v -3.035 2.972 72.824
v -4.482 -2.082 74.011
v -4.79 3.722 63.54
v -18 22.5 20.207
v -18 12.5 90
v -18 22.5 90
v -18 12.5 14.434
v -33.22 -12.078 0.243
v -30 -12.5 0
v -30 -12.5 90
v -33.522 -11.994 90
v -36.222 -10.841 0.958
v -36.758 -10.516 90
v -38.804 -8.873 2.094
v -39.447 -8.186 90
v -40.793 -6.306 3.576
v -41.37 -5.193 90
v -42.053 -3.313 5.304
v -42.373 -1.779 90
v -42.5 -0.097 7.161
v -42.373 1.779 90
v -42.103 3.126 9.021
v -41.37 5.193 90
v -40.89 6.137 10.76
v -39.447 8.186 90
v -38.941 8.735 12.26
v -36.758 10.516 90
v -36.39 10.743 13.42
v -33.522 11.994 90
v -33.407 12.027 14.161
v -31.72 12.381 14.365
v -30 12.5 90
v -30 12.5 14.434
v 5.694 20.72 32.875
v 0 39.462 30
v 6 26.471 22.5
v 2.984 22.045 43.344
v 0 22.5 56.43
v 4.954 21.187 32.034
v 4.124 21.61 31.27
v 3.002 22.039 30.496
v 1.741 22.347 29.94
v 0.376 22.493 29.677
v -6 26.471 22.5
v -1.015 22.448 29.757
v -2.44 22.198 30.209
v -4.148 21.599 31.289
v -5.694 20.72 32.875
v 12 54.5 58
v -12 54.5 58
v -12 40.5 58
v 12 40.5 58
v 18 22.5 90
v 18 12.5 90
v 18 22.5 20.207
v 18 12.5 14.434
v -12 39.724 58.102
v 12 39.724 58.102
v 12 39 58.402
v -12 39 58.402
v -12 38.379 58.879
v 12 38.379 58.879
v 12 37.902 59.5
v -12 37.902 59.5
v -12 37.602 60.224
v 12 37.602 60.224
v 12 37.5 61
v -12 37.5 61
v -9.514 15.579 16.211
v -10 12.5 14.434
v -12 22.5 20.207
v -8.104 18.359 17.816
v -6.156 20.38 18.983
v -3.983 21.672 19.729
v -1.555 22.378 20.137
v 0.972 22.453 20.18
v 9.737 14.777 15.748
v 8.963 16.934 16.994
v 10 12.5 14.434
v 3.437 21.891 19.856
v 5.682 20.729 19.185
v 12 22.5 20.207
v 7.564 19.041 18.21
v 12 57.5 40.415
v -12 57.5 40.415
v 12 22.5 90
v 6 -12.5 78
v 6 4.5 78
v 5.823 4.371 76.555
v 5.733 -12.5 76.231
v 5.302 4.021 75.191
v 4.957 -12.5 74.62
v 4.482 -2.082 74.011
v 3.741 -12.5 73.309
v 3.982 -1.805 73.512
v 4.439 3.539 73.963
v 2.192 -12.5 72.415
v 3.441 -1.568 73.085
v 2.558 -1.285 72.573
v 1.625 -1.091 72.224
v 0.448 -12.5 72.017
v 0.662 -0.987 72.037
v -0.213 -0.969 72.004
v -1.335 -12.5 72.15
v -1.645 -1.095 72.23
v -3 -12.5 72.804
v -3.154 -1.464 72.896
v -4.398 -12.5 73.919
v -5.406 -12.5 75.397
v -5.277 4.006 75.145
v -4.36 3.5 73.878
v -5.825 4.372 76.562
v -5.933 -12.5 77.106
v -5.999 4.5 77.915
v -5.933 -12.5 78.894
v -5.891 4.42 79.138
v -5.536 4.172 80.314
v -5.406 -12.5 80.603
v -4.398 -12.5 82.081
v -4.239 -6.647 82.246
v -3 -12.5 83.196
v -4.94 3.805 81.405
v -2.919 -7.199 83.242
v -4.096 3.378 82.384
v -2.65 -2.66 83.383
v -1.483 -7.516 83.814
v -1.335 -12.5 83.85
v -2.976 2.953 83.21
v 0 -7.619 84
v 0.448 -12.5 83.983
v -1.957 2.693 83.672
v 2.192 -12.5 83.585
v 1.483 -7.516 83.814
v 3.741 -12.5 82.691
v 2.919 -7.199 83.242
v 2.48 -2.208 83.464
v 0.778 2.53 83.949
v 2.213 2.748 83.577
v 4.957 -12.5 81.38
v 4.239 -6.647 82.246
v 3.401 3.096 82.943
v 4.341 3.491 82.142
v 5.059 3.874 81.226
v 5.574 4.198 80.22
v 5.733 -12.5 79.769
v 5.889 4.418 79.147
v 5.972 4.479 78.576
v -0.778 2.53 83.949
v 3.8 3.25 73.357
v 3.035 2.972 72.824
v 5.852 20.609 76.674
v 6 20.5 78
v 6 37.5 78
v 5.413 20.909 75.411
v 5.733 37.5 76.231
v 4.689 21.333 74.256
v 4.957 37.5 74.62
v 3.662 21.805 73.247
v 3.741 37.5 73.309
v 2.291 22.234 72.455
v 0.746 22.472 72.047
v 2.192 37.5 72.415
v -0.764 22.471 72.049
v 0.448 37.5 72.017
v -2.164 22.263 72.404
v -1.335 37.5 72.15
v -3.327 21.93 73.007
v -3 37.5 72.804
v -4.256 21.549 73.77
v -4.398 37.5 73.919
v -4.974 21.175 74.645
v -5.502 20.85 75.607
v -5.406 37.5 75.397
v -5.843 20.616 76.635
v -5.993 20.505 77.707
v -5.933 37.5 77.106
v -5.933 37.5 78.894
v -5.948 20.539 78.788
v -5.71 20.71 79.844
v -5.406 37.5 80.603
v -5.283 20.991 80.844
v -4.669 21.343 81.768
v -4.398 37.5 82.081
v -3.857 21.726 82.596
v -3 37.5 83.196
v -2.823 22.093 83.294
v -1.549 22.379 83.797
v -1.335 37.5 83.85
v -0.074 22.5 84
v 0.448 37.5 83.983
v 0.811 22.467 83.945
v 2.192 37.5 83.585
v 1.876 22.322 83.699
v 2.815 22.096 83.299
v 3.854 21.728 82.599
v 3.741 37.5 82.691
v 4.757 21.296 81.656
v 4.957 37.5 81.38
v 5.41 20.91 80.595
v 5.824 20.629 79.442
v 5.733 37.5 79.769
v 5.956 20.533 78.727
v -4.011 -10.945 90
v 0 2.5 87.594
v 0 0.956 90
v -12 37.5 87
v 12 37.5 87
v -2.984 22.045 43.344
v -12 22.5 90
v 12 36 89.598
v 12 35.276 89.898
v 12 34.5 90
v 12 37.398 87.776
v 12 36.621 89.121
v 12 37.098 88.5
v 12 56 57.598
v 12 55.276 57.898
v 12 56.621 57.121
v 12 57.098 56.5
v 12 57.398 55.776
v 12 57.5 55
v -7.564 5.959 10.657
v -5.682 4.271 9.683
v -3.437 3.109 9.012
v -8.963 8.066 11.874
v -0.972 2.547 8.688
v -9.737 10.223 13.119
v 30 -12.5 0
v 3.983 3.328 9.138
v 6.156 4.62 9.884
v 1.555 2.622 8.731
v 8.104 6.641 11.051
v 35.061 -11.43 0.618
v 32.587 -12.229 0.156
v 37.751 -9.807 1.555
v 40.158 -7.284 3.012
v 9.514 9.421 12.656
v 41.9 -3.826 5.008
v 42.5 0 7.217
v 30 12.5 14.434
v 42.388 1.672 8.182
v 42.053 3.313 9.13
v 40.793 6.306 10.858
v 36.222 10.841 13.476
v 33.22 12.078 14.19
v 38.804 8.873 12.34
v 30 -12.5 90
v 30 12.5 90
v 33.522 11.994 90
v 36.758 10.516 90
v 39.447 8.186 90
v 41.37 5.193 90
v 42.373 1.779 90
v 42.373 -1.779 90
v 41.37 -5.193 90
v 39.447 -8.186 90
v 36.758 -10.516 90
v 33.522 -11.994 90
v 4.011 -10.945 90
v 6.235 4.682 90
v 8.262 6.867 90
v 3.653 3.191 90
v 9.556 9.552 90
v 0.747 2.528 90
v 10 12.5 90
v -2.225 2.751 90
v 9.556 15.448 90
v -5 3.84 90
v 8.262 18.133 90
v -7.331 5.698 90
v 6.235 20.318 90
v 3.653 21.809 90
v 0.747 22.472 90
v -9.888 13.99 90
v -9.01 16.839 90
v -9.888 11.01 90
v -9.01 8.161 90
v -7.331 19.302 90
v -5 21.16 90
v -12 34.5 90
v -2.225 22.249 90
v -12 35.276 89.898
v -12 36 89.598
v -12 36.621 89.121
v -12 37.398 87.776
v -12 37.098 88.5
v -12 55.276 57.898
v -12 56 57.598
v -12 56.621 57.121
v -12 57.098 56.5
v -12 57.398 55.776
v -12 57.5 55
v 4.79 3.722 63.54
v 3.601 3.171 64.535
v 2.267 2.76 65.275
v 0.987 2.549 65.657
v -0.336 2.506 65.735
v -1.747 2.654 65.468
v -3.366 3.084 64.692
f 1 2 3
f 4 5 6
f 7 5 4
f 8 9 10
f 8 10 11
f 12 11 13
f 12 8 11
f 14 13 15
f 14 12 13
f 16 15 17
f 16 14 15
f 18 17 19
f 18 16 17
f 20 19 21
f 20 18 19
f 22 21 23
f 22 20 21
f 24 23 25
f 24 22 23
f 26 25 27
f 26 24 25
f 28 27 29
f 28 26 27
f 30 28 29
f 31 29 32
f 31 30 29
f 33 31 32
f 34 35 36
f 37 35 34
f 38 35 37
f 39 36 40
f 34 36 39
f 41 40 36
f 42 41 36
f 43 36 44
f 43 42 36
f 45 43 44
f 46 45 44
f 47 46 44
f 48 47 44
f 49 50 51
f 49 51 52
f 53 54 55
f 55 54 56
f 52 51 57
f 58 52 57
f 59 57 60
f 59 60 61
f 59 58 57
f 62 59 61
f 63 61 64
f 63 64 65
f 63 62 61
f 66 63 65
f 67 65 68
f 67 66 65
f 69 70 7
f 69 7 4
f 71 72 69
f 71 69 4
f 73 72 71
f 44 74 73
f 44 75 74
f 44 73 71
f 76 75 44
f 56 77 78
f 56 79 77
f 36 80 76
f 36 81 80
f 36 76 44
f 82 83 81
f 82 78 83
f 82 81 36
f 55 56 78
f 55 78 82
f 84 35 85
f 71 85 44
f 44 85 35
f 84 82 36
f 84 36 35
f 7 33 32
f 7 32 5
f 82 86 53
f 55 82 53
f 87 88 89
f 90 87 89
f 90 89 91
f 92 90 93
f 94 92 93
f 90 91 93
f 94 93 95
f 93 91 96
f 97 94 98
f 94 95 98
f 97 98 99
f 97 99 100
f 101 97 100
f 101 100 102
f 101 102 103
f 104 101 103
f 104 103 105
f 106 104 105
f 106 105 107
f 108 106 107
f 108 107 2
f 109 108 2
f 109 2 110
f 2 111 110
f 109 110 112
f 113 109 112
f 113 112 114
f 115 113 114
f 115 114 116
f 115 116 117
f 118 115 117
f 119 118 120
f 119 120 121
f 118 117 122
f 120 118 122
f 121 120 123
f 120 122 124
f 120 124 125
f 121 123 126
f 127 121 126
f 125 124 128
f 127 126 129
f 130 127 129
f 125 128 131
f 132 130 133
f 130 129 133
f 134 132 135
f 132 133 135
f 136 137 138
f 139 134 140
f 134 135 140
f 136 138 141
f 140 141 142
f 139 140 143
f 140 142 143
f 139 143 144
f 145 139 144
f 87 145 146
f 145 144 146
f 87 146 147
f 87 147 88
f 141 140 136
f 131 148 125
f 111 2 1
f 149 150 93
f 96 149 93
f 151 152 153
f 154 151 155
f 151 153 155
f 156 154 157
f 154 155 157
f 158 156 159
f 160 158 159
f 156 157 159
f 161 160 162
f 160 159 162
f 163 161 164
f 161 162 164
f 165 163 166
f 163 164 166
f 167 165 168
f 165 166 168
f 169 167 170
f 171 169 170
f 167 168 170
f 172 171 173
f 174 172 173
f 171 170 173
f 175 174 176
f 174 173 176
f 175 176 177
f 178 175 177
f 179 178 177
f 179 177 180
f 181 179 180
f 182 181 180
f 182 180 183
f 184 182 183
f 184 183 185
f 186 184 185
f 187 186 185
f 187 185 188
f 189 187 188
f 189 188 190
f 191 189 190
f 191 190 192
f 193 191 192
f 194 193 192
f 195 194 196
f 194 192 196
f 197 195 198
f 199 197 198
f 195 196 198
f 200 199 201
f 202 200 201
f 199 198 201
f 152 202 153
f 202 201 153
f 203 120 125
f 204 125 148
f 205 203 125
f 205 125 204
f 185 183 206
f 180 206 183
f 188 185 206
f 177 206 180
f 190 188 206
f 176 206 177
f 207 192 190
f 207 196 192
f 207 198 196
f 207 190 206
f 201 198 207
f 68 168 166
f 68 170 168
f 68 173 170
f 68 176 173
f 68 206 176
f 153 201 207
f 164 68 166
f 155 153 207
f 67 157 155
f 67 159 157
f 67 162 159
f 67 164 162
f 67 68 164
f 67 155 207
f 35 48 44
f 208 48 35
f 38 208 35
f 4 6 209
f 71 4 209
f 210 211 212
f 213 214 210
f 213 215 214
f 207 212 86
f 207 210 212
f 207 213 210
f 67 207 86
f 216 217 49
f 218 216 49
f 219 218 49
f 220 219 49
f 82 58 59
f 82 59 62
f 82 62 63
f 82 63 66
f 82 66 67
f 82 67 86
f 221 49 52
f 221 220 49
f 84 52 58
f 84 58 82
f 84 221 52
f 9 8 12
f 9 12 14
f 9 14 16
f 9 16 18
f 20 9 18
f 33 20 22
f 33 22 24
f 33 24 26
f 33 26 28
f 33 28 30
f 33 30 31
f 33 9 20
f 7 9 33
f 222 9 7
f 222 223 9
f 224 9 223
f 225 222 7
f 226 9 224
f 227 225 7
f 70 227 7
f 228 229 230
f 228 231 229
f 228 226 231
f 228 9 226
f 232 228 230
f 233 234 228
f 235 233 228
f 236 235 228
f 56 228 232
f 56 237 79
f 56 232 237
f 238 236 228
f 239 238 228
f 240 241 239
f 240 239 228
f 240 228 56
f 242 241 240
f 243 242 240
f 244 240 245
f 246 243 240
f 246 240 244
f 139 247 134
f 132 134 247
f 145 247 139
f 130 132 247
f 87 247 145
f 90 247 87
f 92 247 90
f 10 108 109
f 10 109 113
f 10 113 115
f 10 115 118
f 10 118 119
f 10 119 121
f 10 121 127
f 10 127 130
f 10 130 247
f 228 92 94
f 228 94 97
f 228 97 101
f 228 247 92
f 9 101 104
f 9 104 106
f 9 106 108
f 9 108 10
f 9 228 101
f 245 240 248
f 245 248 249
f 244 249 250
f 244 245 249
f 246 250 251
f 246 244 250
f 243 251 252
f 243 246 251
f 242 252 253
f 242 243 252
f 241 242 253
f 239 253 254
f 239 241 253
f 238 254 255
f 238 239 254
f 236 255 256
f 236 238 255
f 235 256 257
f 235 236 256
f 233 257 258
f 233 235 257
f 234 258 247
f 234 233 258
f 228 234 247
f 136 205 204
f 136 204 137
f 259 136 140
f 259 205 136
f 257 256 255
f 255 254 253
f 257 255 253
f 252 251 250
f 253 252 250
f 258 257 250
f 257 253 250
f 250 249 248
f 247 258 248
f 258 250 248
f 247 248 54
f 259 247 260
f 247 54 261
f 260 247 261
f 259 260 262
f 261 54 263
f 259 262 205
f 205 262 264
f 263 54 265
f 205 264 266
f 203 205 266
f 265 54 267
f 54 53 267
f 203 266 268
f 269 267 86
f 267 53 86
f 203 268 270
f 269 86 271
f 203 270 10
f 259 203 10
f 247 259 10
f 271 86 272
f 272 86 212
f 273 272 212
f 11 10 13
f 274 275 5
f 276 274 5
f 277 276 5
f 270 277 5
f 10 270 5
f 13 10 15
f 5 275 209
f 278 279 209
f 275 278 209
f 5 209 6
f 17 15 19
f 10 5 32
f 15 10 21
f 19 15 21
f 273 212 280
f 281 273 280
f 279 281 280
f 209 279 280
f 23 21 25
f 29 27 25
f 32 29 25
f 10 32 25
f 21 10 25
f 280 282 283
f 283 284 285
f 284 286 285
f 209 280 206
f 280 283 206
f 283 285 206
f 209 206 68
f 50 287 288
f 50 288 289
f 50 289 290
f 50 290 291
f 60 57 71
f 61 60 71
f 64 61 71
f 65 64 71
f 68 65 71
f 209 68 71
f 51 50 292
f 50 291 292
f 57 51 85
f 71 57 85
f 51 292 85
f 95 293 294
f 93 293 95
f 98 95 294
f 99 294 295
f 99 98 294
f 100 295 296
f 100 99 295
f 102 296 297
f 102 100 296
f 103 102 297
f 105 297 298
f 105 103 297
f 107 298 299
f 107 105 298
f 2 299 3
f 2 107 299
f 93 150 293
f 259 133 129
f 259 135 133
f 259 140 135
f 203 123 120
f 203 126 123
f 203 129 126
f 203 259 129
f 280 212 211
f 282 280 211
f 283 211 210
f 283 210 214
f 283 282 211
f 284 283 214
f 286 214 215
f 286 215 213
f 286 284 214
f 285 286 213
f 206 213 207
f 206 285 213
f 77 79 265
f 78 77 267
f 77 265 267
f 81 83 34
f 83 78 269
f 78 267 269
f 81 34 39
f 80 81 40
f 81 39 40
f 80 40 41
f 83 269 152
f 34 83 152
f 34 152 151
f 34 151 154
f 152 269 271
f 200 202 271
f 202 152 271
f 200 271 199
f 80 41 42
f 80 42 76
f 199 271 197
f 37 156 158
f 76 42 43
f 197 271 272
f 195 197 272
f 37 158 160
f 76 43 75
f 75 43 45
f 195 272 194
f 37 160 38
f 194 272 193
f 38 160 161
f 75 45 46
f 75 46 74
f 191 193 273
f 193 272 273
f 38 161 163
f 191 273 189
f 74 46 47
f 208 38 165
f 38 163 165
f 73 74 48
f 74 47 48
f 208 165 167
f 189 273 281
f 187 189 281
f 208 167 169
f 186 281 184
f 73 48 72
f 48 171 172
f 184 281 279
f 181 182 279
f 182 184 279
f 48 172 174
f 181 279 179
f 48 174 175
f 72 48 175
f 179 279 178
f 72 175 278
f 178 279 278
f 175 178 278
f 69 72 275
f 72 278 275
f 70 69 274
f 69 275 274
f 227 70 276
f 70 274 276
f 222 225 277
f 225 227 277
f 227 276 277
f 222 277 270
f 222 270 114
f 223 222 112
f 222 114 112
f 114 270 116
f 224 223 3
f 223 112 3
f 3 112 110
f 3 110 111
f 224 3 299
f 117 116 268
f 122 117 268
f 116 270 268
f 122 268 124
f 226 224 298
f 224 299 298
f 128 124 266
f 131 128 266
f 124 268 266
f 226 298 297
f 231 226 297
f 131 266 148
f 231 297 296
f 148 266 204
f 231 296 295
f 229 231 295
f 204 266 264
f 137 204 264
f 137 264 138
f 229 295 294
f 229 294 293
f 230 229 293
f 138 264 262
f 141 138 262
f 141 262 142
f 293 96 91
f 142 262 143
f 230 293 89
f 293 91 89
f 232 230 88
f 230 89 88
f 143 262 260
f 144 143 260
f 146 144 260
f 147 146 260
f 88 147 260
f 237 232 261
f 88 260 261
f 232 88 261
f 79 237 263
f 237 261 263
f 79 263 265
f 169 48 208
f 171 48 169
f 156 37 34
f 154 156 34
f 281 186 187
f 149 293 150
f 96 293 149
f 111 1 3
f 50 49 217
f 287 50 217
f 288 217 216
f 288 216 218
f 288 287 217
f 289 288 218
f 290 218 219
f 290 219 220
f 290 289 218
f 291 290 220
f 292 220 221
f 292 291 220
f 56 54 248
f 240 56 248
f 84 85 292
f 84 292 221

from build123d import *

# Parameters (mm, degrees)
BOSS_EXTRUDE1_DEPTH = 90
CUT_EXTRUDE1_DEPTH  = 90
SKETCH3_W           = 36
SKETCH3_H           = 75.56624327
BOSS_EXTRUDE2_DEPTH = 10
SKETCH4_W           = 24
SKETCH4_H           = 75.56624327
BOSS_EXTRUDE3_DEPTH = 35
SKETCH5_W           = 24
SKETCH5_H           = 32
CUT_EXTRUDE2_DEPTH  = 20
CUT_EXTRUDE3_DEPTH  = 440
SKETCH9_R           = 10
CUT_EXTRUDE6_DEPTH  = 440
SKETCH11_R          = 6
CUT_EXTRUDE7_DEPTH  = 440
CUT_EXTRUDE8_DEPTH  = 440
CUT_EXTRUDE9_DEPTH  = 440
CUT_EXTRUDE10_DEPTH = 89
CUT_EXTRUDE10_TAPER = 1
BOSS_EXTRUDE4_DEPTH = 24


with BuildPart() as part:
    # Sketch1 → Boss-Extrude1 (new body)
    with BuildSketch(Plane.XY):
        with BuildLine():
            Line((-30, 12.5), (30, 12.5))
            ThreePointArc((30, 12.5), (42.5, 0), (30, -12.5))
            Line((30, -12.5), (-30, -12.5))
            ThreePointArc((-30, -12.5), (-42.5, 0), (-30, 12.5))
        make_face()
    extrude(amount=BOSS_EXTRUDE1_DEPTH)

    # Sketch2 → Cut-Extrude1 (cut)
    with BuildSketch(Plane(origin=(42.5, 0, 0), x_dir=(0, 0, -1), z_dir=(1, 0, 0))):
        Polygon((0, -12.5), (-14.43375673, 12.5), (0, 12.5), align=None)
    extrude(amount=-CUT_EXTRUDE1_DEPTH, mode=Mode.SUBTRACT)

    # Sketch3 → Boss-Extrude2 (add)
    with BuildSketch(Plane(origin=(0, 12.5, 0), x_dir=(1, 0, 0), z_dir=(0, 1, 0))):
        with Locations((0, -52.216878365)):
            Rectangle(SKETCH3_W, SKETCH3_H)
    extrude(amount=BOSS_EXTRUDE2_DEPTH)

    # Sketch4 → Boss-Extrude3 (add)
    with BuildSketch(Plane(origin=(0, 22.5, 0), x_dir=(1, 0, 0), z_dir=(0, 1, 0))):
        with Locations((0, -52.216878365)):
            Rectangle(SKETCH4_W, SKETCH4_H)
    extrude(amount=BOSS_EXTRUDE3_DEPTH)

    # Sketch5 → Cut-Extrude2 (cut)
    with BuildSketch(Plane(origin=(0, 57.5, 0), x_dir=(1, 0, 0), z_dir=(0, 1, 0))):
        with Locations((0, -74)):
            Rectangle(SKETCH5_W, SKETCH5_H)
    extrude(amount=-CUT_EXTRUDE2_DEPTH, mode=Mode.SUBTRACT)

    # Sketch6 → Cut-Extrude3 (cut)
    with BuildSketch(Plane(origin=(42.5, 0, 0), x_dir=(0, 0, -1), z_dir=(1, 0, 0))):
        Polygon((-14.43375673, 12.5), (-40.414518843, 57.5), (-14.43375673, 57.5), align=None)
    extrude(amount=-CUT_EXTRUDE3_DEPTH, mode=Mode.SUBTRACT)

    # Sketch9 → Cut-Extrude6 (cut)
    with BuildSketch(Plane.XY.offset(90)):
        with Locations((0, 12.5)):
            Circle(SKETCH9_R)
    extrude(amount=-CUT_EXTRUDE6_DEPTH, mode=Mode.SUBTRACT)

    # Sketch11 → Cut-Extrude7 (cut)
    with BuildSketch(Plane(origin=(0, 37.5, 0), x_dir=(1, 0, 0), z_dir=(0, 1, 0))):
        with Locations((0, -78)):
            Circle(SKETCH11_R)
    extrude(amount=-CUT_EXTRUDE7_DEPTH, mode=Mode.SUBTRACT)

    # Sketch12 → Cut-Extrude8 (cut)
    with BuildSketch(Plane.ZY.offset(12)):
        with BuildLine():
            Line((55, 57.5), (58, 57.5))
            Line((58, 57.5), (58, 54.5))
            ThreePointArc((58, 54.5), (57.121320344, 56.621320344), (55, 57.5))
        make_face()
    extrude(amount=-CUT_EXTRUDE8_DEPTH, mode=Mode.SUBTRACT)

    # Sketch13 → Cut-Extrude9 (cut)
    with BuildSketch(Plane.ZY.offset(12)):
        with BuildLine():
            Line((87, 37.5), (90, 37.5))
            Line((90, 37.5), (90, 34.5))
            ThreePointArc((90, 34.5), (89.121320344, 36.621320344), (87, 37.5))
        make_face()
    extrude(amount=-CUT_EXTRUDE9_DEPTH, mode=Mode.SUBTRACT)

    # Sketch14 → Cut-Extrude10 (cut)
    with BuildSketch(Plane(origin=(0, -3.125, 5.412658774), x_dir=(-1, 0, 0), z_dir=(0, 0.5, -0.866025404))):
        Polygon((-6, 34.174682453), (6, 34.174682453), (0, 49.174682453), align=None)
    extrude(amount=-CUT_EXTRUDE10_DEPTH, taper=CUT_EXTRUDE10_TAPER, mode=Mode.SUBTRACT)

    # Sketch16 → Boss-Extrude4 (add)
    with BuildSketch(Plane(origin=(12, 0, 0), x_dir=(0, 0, -1), z_dir=(1, 0, 0))):
        with BuildLine():
            Line((-61, 37.5), (-58, 37.5))
            Line((-58, 37.5), (-58, 40.5))
            ThreePointArc((-58, 40.5), (-58.878679656, 38.378679656), (-61, 37.5))
        make_face()
    extrude(amount=-BOSS_EXTRUDE4_DEPTH)


solid = part.part
